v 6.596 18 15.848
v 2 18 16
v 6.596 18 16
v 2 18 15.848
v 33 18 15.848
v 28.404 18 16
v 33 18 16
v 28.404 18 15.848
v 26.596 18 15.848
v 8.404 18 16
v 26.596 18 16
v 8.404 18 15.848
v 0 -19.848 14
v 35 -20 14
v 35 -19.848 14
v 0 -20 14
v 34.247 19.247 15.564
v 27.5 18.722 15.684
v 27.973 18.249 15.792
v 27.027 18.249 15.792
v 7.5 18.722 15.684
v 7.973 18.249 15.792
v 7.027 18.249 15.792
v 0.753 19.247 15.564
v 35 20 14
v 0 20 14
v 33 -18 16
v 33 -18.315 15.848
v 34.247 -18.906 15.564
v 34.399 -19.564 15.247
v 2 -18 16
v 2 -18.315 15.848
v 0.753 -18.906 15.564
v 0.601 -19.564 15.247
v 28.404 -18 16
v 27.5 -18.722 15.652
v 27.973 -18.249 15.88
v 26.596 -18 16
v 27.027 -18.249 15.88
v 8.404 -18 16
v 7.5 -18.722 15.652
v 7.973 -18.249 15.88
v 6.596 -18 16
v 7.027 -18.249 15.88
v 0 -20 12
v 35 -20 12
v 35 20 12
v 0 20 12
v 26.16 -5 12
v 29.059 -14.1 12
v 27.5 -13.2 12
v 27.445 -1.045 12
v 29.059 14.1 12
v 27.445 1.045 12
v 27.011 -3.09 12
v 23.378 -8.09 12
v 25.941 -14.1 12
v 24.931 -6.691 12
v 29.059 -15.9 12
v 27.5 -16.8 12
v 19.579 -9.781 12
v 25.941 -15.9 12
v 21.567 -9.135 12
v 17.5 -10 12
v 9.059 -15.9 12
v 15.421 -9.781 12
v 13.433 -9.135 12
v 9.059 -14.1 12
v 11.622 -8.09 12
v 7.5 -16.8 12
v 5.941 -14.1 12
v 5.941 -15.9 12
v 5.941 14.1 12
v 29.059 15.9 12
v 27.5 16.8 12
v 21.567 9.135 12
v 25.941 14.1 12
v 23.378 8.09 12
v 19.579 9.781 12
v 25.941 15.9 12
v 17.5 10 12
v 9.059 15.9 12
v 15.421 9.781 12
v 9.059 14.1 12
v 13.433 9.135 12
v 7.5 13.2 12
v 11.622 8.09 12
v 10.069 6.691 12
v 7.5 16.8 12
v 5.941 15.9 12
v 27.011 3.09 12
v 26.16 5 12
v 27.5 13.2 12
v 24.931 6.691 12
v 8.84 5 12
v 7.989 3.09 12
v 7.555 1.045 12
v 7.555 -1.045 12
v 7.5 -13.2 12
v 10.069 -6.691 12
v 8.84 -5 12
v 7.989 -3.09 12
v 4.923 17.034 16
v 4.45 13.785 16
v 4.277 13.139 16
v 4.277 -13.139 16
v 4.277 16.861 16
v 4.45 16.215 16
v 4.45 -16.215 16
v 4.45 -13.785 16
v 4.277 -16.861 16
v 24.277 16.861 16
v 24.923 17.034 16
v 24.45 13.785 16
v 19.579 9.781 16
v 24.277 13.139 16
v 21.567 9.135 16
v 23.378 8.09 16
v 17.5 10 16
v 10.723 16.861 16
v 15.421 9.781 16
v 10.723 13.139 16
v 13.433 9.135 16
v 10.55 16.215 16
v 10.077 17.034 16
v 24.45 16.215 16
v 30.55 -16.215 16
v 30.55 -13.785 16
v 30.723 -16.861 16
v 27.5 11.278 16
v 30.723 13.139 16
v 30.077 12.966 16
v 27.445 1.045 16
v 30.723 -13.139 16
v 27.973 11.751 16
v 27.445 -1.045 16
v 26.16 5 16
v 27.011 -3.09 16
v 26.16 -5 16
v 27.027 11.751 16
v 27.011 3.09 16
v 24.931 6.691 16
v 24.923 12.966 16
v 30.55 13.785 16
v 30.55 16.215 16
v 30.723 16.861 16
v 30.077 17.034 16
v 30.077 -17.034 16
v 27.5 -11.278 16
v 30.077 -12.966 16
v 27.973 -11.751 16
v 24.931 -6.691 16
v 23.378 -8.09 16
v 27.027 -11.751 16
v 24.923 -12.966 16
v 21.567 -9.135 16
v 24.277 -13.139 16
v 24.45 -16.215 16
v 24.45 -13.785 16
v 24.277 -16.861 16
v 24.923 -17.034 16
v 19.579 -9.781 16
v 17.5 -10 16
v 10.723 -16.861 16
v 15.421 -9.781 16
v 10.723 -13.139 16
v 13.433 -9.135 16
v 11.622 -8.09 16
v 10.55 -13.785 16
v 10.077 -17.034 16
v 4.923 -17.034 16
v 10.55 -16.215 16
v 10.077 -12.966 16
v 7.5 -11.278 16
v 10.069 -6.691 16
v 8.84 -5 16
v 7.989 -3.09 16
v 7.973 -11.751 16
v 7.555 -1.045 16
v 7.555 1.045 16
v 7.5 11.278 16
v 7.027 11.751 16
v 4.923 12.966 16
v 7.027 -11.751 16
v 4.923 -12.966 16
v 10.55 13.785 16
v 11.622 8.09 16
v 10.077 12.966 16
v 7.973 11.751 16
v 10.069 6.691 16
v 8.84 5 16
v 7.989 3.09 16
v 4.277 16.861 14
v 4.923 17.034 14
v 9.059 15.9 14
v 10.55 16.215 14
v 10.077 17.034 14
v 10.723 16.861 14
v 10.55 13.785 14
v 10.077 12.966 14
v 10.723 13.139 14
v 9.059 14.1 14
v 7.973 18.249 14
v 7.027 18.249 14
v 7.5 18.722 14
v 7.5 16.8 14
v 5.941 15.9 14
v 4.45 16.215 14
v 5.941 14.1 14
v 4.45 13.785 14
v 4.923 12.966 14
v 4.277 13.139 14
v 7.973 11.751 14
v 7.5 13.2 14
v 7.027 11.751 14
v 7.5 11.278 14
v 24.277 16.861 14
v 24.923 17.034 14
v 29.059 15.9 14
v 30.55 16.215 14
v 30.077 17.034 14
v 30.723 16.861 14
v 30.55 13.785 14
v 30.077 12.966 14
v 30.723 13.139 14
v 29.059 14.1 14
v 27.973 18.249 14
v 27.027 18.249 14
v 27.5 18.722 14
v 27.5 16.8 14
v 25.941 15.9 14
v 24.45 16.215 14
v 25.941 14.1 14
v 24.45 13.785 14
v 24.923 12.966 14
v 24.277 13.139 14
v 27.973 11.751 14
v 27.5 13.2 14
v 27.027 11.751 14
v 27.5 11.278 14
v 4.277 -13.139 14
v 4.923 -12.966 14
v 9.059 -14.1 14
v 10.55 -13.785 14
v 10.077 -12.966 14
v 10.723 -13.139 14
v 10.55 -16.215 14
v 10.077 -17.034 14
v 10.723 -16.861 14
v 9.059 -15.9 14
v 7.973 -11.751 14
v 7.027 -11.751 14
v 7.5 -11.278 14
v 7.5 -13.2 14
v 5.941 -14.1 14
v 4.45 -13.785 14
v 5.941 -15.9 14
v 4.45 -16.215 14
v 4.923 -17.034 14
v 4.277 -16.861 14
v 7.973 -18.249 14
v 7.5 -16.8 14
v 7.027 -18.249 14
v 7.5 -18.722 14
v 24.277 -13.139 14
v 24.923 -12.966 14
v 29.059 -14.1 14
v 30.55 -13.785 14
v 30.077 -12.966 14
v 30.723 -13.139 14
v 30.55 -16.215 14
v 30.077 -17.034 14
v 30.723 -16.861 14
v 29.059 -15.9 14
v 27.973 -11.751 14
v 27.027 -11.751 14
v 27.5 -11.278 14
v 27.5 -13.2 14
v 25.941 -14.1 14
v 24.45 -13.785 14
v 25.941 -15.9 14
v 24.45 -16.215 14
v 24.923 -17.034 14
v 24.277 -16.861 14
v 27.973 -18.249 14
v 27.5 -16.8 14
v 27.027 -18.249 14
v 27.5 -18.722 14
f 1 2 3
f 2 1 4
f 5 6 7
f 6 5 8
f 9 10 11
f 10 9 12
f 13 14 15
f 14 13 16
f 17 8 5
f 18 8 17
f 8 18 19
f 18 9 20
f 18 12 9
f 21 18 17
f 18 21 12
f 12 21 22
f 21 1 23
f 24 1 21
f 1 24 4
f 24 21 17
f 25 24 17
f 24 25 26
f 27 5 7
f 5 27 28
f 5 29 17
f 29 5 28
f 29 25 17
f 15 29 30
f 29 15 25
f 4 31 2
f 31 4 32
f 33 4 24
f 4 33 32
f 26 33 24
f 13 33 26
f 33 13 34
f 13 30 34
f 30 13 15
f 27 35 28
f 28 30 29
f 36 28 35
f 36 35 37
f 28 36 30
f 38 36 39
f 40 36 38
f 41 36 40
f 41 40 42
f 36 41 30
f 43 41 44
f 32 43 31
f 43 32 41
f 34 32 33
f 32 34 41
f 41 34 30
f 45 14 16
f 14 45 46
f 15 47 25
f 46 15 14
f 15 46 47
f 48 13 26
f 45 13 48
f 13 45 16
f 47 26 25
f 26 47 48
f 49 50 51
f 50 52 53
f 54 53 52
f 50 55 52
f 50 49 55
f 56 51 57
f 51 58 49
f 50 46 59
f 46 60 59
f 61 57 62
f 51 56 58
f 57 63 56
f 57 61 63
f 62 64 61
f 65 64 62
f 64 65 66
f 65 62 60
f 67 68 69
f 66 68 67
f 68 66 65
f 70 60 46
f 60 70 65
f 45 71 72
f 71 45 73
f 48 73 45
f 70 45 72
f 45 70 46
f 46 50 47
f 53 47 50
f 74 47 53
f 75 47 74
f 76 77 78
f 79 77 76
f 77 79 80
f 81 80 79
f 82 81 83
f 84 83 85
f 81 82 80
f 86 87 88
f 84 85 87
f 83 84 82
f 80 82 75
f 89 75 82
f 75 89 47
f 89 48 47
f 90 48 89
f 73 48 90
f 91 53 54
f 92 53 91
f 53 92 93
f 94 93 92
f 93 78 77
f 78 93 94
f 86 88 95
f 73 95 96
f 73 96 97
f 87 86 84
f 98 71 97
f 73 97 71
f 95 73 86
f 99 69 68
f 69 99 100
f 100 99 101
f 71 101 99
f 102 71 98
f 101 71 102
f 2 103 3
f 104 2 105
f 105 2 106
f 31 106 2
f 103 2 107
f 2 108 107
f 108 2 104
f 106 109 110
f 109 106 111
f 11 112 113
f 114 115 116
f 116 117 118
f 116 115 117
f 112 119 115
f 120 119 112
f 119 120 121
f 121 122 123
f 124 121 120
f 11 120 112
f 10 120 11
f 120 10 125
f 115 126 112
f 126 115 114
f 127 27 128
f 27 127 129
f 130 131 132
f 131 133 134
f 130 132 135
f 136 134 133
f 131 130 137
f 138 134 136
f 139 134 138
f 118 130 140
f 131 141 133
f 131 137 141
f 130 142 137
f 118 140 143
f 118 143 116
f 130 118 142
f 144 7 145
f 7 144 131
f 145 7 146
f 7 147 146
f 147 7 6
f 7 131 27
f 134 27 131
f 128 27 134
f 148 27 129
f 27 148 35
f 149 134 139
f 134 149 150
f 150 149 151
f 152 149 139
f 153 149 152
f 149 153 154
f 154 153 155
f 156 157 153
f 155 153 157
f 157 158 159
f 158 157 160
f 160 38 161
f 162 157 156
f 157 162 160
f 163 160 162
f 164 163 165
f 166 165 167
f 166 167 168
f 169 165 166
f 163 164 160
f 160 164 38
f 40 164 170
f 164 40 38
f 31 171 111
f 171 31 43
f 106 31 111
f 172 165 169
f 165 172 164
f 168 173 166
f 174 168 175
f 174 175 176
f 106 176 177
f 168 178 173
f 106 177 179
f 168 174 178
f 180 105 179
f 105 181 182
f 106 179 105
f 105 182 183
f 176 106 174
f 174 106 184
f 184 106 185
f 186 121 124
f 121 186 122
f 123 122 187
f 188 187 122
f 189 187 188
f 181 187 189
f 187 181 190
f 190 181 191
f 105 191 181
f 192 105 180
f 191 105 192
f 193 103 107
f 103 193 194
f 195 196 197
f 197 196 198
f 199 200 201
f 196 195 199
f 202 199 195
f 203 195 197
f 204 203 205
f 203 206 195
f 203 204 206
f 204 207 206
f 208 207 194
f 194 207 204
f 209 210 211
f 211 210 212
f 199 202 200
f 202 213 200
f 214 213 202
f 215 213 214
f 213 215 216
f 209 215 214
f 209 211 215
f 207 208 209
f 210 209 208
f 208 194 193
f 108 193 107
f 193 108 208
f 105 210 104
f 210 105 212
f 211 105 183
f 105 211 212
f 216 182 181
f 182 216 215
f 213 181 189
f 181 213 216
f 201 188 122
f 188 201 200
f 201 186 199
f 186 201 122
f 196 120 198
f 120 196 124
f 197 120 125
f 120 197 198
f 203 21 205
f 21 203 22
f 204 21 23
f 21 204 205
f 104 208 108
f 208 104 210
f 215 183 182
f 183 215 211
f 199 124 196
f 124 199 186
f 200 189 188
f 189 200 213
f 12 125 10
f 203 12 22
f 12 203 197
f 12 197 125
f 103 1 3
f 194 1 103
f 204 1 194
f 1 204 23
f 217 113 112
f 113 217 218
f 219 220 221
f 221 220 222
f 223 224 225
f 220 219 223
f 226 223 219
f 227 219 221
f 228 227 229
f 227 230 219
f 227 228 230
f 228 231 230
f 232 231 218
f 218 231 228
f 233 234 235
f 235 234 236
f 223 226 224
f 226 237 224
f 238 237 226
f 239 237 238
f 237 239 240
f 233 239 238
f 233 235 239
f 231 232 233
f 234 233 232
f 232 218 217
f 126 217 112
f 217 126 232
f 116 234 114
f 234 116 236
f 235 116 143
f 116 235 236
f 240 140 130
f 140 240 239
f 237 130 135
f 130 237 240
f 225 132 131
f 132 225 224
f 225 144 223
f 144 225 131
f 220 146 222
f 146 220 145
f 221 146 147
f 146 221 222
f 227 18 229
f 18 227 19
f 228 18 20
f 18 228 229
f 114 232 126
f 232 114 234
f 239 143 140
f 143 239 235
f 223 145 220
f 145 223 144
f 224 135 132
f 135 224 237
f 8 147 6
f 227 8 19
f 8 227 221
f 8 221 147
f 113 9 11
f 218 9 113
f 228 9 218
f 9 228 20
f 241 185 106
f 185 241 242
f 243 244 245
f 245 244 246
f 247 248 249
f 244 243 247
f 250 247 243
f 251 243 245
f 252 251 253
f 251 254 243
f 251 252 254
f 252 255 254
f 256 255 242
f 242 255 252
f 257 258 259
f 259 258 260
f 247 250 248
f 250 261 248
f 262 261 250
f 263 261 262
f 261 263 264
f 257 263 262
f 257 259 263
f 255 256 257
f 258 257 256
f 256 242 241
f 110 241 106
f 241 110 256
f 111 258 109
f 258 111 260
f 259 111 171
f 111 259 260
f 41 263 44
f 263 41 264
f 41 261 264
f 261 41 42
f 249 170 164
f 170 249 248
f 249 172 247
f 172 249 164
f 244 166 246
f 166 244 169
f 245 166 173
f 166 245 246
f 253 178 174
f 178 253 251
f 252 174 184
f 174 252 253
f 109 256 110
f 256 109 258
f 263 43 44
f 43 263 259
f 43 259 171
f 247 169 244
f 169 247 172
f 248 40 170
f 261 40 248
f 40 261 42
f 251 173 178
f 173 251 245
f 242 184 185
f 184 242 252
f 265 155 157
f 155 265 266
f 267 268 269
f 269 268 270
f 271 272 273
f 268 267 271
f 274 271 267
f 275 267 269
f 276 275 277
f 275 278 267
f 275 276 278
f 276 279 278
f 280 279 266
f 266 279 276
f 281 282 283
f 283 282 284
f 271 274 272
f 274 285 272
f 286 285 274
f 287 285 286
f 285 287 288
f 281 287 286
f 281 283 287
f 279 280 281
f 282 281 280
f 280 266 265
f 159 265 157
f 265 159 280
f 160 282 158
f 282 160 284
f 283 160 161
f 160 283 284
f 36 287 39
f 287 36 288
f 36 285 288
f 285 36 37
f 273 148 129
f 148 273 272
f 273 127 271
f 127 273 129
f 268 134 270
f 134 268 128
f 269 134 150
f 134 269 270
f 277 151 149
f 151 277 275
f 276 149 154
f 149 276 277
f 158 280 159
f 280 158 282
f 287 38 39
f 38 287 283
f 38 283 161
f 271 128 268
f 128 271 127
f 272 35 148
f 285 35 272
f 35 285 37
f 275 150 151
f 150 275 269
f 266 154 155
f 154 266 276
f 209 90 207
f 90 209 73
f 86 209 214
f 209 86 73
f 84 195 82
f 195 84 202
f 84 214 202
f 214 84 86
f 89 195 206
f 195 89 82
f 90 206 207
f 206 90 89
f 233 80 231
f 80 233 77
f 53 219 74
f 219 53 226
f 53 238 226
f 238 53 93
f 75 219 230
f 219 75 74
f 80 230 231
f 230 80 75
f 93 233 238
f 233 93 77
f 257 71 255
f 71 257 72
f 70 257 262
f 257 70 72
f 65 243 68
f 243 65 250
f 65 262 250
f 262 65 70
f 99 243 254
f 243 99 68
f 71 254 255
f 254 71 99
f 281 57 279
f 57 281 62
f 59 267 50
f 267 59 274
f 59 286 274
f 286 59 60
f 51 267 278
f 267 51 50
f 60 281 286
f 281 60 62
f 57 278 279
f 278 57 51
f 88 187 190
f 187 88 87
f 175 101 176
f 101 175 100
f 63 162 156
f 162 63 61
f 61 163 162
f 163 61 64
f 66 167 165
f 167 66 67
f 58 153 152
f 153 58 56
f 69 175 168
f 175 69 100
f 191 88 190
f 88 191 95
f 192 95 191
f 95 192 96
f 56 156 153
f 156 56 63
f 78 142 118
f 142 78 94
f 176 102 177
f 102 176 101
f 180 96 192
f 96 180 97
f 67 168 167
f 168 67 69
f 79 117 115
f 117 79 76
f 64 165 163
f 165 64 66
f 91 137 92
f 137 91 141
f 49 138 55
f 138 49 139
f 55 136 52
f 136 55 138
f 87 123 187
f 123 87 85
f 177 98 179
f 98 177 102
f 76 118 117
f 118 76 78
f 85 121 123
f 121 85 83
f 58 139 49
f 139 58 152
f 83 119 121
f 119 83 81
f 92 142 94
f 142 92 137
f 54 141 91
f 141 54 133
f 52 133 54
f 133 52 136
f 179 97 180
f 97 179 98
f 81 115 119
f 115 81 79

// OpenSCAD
// file: inc/functions.scad
// PRUSA iteration3
// Functions used in many files
// GNU GPL v3
// Josef Průša <josefprusa@me.com>
// Václav 'ax' Hůla <axtheb@gmail.com>
// Vlnofka <>
// http://www.reprap.org/wiki/Prusa_Mendel
// http://github.com/prusajr/PrusaMendel

module roundcorner(diameter){
	difference(){
		cube(size = [diameter,diameter,99], center = false);
		translate(v = [diameter, diameter, 0]) cylinder(h = 100, r=diameter, center=true);
	}
}
module nut(d,h,horizontal=true){
    cornerdiameter =  (d / 2) / cos (180 / 6);
    cylinder(h = h, r = cornerdiameter, $fn = 6);
    if(horizontal){
        for(i = [1:6]){
            rotate([0,0,60*i]) translate([-cornerdiameter-0.2,0,0]) rotate([0,0,-45]) cube([2,2,h]);
        }
    }
}

// Based on nophead research
module polyhole(d, h, center=false) {
    n = max(round(2 * d),3);
    rotate([0,0,180])
        cylinder(h = h, r = (d / 2) / cos (180 / n), $fn = n);
}

// make it interchangeable between this and cylinder
module cylinder_poly(r, h, center=false){
    polyhole(d=r*2, h=h, center=center);
}

module fillet(radius, height=100, $fn=0) {
    //this creates acutal fillet
    translate([-radius, -radius, -height/2-0.01])
        difference() {
            cube([radius*2, radius*2, height+0.02]);
            cylinder(r=radius, h=height+0.02, $fn=$fn);
        }
}

module cube_fillet(size, radius=-1, vertical=[3,3,3,3], top=[0,0,0,0], bottom=[0,0,0,0], center=false, $fn=0){
    //
    if (center) {
        cube_fillet_inside(size, radius, vertical, top, bottom, $fn);
    } else {
        translate([size[0]/2, size[1]/2, size[2]/2])
            cube_fillet_inside(size, radius, vertical, top, bottom, $fn);
    }
}

module cube_negative_fillet(size, radius=-1, vertical=[3,3,3,3], top=[0,0,0,0], bottom=[0,0,0,0], $fn=0){

    j=[1,0,1,0];

    for (i=[0:3]) {
        if (radius > -1) {
            rotate([0, 0, 90*i]) translate([size[1-j[i]]/2, size[j[i]]/2, 0]) fillet(radius, size[2], $fn=$fn);
        } else {
            rotate([0, 0, 90*i]) translate([size[1-j[i]]/2, size[j[i]]/2, 0]) fillet(vertical[i], size[2], $fn=$fn);
        }
        rotate([90*i, -90, 0]) translate([size[2]/2, size[j[i]]/2, 0 ]) fillet(top[i], size[1-j[i]], $fn=$fn);
        rotate([90*(4-i), 90, 0]) translate([size[2]/2, size[j[i]]/2, 0]) fillet(bottom[i], size[1-j[i]], $fn=$fn);

    }
}

module cube_fillet_inside(size, radius=-1, vertical=[3,3,3,3], top=[0,0,0,0], bottom=[0,0,0,0], $fn=0){
    //makes CENTERED cube with round corners
    // if you give it radius, it will fillet vertical corners.
    //othervise use vertical, top, bottom arrays
    //when viewed from top, it starts in upper right corner (+x,+y quadrant) , goes counterclockwise
    //top/bottom fillet starts in direction of Y axis and goes CCW too


    if (radius == 0) {
        cube(size, center=true);
    } else {
        difference() {
            cube(size, center=true);
            cube_negative_fillet(size, radius, vertical, top, bottom, $fn);
        }
    }
}


module nema17(places=[1,1,1,1], size=15.5, h=10, holes=false, shadow=false, $fn=24){
    for (i=[0:3]) {
        if (places[i] == 1) {
            rotate([0, 0, 90*i]) translate([size, size, 0]) {
                if (holes) {
                    #rotate([0, 0, -90*i])  translate([0,0,-10]) screw(r=1.7, slant=false, head_drop=13, $fn=$fn, h=h+12);
                } else {
                    rotate([0, 0, -90*i]) cylinder(h=h, r=5.5, $fn=$fn);
                }
            }
        }
    }
    if (shadow != false) {
        %translate ([0, 0, shadow+21+3]) cube([42,42,42], center = true);
    //flange
        %translate ([0, 0, shadow+21+3-21-1]) cylinder(r=11,h=2, center = true, $fn=20);
    //shaft
        %translate ([0, 0, shadow+21+3-21-7]) cylinder(r=2.5,h=14, center = true);
    }
}

module screw(h=20, r=2, r_head=3.5, head_drop=0, slant=true, poly=false, $fn=0){
    //makes screw with head
    //for substraction as screw hole
    if (poly) {
        cylinder_poly(h=h, r=r, $fn=$fn);
    } else {
        cylinder(h=h, r=r, $fn=$fn);
    }
    if (slant) {
        translate([0, 0, head_drop-0.01]) cylinder(h=r_head, r2=0, r1=r_head, $fn=$fn);
    }

    if (head_drop > 0) {
        translate([0, 0, -0.01]) cylinder(h=head_drop+0.01, r=r_head, $fn=$fn);
    }
}
module screw_cylinder(r_head=5.25,r=3.25,head_drop=6.2,slant=false){
	screw(r_head=r_head,head_drop=head_drop,r=r, slant=slant);

}

//screw_cylinder();
//cube_fillet([10,20,30], vertical=[3,2,0,0], top=[3,2,0,5], bottom=[3,2,0,5]);
//cube_fillet([10,20,30], radius=2, top=[7,2,7,2]);
// file: inc/metric.scad
// PRUSA iteration3
// Default metric sizes
// GNU GPL v3
// Josef Průša <josefprusa@me.com>
// http://www.reprap.org/wiki/Prusa_Mendel
// http://github.com/prusajr/PrusaMendel

// DONT CHANGE THIS FILE! ALTER VALUES IN CONFIGURATION.SCAD INSTEAD

// RODS

threaded_rod_diameter = 8.7;
threaded_rod_diameter_horizontal = 8.7;
smooth_bar_diameter = 8;
smooth_bar_diameter_horizontal = 8.8;

// Nuts and bolts

m8_diameter = 9;
m8_nut_diameter = 14.1;

m4_diameter = 4.5;
m4_nut_diameter = 9;

m3_diameter = 3.6;
m3_nut_diameter = 5.3;
m3_nut_diameter_horizontal = 6.1;

// Bushing holder

bushing_core_diameter = smooth_bar_diameter;
bushing_material_thickness = 1;

// Motors

motor_shaft = 5.5;
// file: configuration.scad
// PRUSA iteration3
// Configuration file
// GNU GPL v3
// Josef Průša <josefprusa@me.com>
// Václav 'ax' Hůla <axtheb@gmail.com>
// http://www.reprap.org/wiki/Prusa_Mendel
// http://github.com/prusajr/PrusaMendel

// PLEASE SELECT ONE OF THE CONFIGURATIONS BELOW
// BY UN-COMMENTING IT

// Uncomment for metric settings
// METRIC METRIC METRIC METRIC METRIC METRIC METRIC METRIC 

include <inc/metric.scad>;

// Custom settings here, tailor to your supplies and print settings

// Select your belt type ******************************************************

//T2.5
//belt_tooth_distance = 2.5;
//belt_tooth_ratio = 0.5;

//T5 (strongly discouraged)
belt_tooth_distance = 5;
belt_tooth_ratio = 0.75;

//HTD3
//belt_tooth_distance = 3;
//belt_tooth_ratio = 0.75;

//MXL
//belt_tooth_distance = 2.032;
//belt_tooth_ratio = 0.64;

// Choose bearing/bushing configuration ***************************************

//Choose from:

// 0 = Z as lm[e]8uu, X and Y bushings
// 1 = all bushings
// 2 = all bearings [default. Do not change unless you really know what you are doing]
// DO NOT OFFER 0 or 1 VARIANTS FOR SALE. We really mean that. In the long run it hurts everyone.

bearing_choice = 2;

// Bushing version
// 0 = square igus housings. By igus we mean JFM-0810-10 or GFM-0810-10
// 1 = round igus (works better if printed precisely)
// 2 = bronze self-aligning bushings
bushing_type = 0;

//Bearing version
// 0 = default lm8uu
// 1 = lme8uu
bearing_type = 0;

// Select idler bearing size **************************************************

// 0 = 608 [standard skate bearings]
// 1 = 624 [roughly same diameter as pulley, makes belt parallel so its prettier]

idler_bearing = 0;

// Thickness of the XZ plate board
board_thickness = 12;

//Layer height * width over thickness. Used for idler sleeve
single_wall_width = 0.3*2.2;

// END of custom settings


// You are not supposed to change this
board_to_xz_distance = 26;
xaxis_rod_distance = 45;
carriage_l = 74;
carriage_hole_to_side = 5;
carriage_hole_height = 4;

//calculated from settings

idler_size = (idler_bearing == 0) ? 22 : 13;

//use 4.5 for 608, 2.5 for 624
idler_size_inner_r = (idler_bearing == 0) ? 4.5 : 2.5;

idler_width = (idler_bearing == 0) ? 9 : 5;

// CHANGE ONLY THE STUFF YOU KNOW
// IT WILL REPLACE DEFAULT SETTING

// RODS

// threaded_rod_diameter = 0;
// threaded_rod_diameter_horizontal = 0;
// smooth_bar_diameter = 0;
// smooth_bar_diameter_horizontal = 0;

// Nuts and bolts

// m8_diameter = 0;
// m8_nut_diameter = 0;

// m4_diameter = 0;
// m4_nut_diameter = 0;

// m3_diameter = 0;
// m3_nut_diameter = 0;

// Bushing holder

// bushing_core_diameter = smooth_bar_diameter;
// bushing_material_thickness = 0;

///counted stuff
m3_nut_diameter_bigger = ((m3_nut_diameter  / 2) / cos (180 / 6))*2;

// functions
include <inc/functions.scad>


// These constants define the geometry of the complete-printer.scad

//x_smooth_rod_length=325;
//y_smooth_rod_length=405;
//z_smooth_rod_length=235;
bed_x_size=225;
bed_y_size=225;

x_smooth_rod_length=450+board_thickness*2+10; // 492 for 16mm thickness; 484 for 12mm thickness
y_smooth_rod_length=470;
z_smooth_rod_length=405;  
bed_x_size=225;
bed_y_size=225;
// main file
// PRUSA iteration3
// Y belt holder
// GNU GPL v3
// Josef Průša <josefprusa@me.com>
// Václav 'ax' Hůla <axtheb@gmail.com>
// http://www.reprap.org/wiki/Prusa_Mendel
// http://github.com/prusajr/PrusaMendel

include <configuration.scad>
//y_belt_holder();
rotate([0,90,0])beltholder_nuts();


module y_belt_holder(){
translate([0, -10, 0])rotate([0,0,-90]){
	difference(){
    	union(){
    		translate([-24.5+9.5, 0, 17.5]) cube_fillet([10, 14, 35], center = true, vertical=[3,3,0,0], fn=8 );
    
    		translate([-10, 1.5-9, 17.5]) cube([40, 5, 35], center = true);

    		difference(){        	
            translate([-4.0, 0, 17.5]) cube_fillet([8.5, 14, 35], center = true, vertical = [2,2,0,2], fn=8);        
        		translate([-4.5, 0, 17.5]) cube([10, 10, 10], center = true);       
        
        		intersection() {
            	for (i = [0 : 35/belt_tooth_distance])
            	{
                	translate([-9.0, 0, 1+i*belt_tooth_distance]) cube([3, 10, belt_tooth_distance*belt_tooth_ratio], center = true);
            	}
            	translate([0, 0, 35/2]) cube([20, 10, 35], center = true);
        		}

    		}
		}

		translate([-25, -4, 8]) rotate([90, 0, 0]) screw();
		translate([-25, -4, 28]) rotate([90, 0, 0]) screw();
		translate([5, -4, 8]) rotate([90, 0, 0]) screw();
		translate([5, -4, 28]) rotate([90, 0, 0]) screw();

	}
}
}

module beltholder_nuts(){
	translate([-14, 0, 17.5])rotate([0,0,-90]) {
		difference(){
			cube_fillet([40, 4, 35], center = true,vertical = [0,0,2,2],top=[0,0,2,0],bottom=[0,0,2,0], fn=8);
			translate([-15, 10, -10]) rotate([90, 0, 0]) cylinder(r=m3_diameter/2,h=20);
			translate([-15, 0, -10]) rotate([90,0,0])nut(d=m3_nut_diameter_horizontal,h=2.5);

			translate([-15, 10, 10]) rotate([90, 0, 0]) cylinder(r=m3_diameter/2,h=20);
			translate([-15, 0, 10])rotate([90,0,0])nut(d=m3_nut_diameter_horizontal,h=2.5);

			translate([15, 10, -10]) rotate([90, 0, 0]) cylinder(r=m3_diameter/2,h=20);
			translate([15, 0, -10])rotate([90,0,0])nut(d=m3_nut_diameter_horizontal,h=2.5);

			translate([15, 10, 10]) rotate([90, 0, 0]) cylinder(r=m3_diameter/2,h=20);
			translate([15, 0, 10])rotate([90,0,0])nut(d=m3_nut_diameter_horizontal,h=2.5);

			translate([0, 5, 0])rotate([90,0,0])cylinder(r=10,h=10);
			
		}
		
	}

}
